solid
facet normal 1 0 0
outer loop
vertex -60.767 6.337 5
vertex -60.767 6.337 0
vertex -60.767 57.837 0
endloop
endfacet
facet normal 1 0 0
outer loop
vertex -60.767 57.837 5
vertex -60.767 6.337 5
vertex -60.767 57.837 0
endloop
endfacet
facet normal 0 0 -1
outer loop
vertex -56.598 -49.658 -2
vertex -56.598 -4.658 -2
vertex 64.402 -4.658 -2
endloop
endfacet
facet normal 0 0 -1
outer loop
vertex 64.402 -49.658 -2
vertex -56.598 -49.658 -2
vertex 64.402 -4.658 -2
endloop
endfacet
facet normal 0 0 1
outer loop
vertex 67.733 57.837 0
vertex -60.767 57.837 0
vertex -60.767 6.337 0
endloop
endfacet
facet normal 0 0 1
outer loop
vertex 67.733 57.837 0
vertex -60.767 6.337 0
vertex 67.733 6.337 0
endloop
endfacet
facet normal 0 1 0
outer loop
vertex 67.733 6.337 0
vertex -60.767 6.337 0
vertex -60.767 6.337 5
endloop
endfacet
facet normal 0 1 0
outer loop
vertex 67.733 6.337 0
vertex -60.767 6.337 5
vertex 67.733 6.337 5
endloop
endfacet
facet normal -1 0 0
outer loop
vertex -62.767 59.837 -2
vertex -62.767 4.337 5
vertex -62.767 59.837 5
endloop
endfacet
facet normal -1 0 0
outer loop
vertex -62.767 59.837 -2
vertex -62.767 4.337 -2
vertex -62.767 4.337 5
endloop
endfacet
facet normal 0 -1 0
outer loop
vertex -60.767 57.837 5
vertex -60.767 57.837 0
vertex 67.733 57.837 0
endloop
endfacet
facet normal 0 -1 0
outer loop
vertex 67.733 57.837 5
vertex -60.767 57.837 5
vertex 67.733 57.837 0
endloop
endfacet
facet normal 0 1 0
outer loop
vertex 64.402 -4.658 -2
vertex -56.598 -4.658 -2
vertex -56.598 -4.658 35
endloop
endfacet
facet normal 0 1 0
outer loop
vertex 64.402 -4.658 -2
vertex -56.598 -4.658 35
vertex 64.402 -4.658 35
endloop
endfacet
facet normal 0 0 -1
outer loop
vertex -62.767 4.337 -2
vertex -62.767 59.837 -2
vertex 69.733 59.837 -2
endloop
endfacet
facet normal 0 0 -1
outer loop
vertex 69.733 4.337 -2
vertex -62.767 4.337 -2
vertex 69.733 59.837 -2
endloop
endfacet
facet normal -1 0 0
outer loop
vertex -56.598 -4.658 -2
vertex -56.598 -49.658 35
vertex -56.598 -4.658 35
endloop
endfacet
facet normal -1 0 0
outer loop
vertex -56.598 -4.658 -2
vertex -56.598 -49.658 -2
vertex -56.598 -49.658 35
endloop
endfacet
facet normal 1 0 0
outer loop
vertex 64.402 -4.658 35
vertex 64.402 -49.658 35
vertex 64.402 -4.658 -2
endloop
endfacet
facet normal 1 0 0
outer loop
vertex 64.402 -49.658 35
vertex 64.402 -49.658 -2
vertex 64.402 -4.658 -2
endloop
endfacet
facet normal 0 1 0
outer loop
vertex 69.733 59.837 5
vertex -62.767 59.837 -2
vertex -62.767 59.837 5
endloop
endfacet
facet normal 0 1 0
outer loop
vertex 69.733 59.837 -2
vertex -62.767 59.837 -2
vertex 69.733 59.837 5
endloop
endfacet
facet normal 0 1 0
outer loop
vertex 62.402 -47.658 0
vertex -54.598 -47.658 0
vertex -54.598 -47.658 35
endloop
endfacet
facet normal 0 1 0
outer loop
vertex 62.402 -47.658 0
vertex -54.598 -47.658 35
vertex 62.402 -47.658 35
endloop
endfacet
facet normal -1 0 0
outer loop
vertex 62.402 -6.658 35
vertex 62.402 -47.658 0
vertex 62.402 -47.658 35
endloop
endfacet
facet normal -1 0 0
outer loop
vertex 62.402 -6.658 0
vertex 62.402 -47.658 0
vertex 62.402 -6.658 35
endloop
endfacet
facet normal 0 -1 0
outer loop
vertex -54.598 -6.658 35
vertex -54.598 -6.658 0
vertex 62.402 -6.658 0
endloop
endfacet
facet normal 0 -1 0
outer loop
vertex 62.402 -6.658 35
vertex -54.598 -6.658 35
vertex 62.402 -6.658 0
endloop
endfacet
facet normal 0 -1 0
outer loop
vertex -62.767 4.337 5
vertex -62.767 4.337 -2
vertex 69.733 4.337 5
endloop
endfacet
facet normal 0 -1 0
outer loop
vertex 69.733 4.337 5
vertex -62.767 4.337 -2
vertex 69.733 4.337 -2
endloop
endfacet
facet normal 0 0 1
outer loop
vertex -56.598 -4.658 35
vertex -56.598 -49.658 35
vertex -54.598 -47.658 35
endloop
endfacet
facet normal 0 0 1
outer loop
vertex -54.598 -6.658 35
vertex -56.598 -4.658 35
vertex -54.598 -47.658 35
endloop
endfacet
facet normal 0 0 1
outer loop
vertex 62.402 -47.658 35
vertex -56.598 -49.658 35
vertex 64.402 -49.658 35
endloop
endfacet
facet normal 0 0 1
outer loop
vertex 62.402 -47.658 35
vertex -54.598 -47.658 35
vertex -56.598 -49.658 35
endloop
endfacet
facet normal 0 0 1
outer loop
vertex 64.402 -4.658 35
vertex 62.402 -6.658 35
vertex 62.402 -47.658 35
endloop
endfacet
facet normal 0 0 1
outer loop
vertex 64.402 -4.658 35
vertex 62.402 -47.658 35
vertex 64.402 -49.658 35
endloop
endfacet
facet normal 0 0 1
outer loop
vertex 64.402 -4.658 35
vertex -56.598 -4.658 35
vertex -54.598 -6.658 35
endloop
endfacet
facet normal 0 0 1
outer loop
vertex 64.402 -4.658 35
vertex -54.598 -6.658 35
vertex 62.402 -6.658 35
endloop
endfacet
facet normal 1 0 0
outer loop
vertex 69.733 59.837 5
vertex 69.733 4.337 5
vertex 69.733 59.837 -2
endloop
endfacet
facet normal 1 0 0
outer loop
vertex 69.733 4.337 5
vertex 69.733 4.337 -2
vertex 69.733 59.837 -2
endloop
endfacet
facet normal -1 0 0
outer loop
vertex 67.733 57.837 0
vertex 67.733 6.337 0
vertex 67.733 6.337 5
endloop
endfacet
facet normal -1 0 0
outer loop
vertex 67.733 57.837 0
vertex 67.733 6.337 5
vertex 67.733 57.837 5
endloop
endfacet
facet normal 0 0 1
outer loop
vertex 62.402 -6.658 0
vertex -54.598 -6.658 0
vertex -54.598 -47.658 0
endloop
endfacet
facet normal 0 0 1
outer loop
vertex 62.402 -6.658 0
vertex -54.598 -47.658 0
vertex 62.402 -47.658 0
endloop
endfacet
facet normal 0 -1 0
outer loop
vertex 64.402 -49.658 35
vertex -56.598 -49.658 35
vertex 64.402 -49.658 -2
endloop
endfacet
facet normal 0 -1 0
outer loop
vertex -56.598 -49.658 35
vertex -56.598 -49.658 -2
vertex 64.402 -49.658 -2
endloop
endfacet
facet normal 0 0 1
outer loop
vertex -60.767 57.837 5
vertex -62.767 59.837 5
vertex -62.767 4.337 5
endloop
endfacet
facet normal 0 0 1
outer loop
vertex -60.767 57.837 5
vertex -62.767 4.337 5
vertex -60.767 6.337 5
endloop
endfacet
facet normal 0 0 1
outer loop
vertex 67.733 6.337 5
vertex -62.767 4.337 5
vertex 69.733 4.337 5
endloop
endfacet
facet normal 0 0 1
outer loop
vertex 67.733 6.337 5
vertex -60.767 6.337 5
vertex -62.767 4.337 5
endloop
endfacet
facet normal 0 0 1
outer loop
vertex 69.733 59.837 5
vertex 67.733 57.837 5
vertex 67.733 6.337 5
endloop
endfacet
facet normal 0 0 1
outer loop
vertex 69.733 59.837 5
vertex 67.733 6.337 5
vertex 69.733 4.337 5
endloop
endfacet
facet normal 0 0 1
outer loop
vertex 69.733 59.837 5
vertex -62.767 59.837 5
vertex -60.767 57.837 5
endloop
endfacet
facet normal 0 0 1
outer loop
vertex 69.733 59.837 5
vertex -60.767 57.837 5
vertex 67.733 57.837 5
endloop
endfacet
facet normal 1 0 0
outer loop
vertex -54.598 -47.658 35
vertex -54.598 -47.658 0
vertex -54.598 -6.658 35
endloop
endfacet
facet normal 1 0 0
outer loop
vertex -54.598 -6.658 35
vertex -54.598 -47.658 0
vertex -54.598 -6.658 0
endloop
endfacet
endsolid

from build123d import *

# Parameters (mm, degrees)
F0_W     = 132.5
F0_H     = 55.5
F0_W_2   = 128.5
F0_H_2   = 51.5
F0_W_3   = 121
F0_H_3   = 45
F0_W_4   = 117
F0_H_4   = 41
F1_DEPTH = 2
F2_DEPTH = 5
F3_DEPTH = 35


with BuildPart() as f1:
    # F0 (on Top) → F1 (new body)
    with BuildSketch(Plane.XY):
        with Locations((3.483113, 32.086735)):
            Rectangle(F0_W, F0_H)
        with Locations((3.483113, 32.086735)):
            Rectangle(F0_W_2, F0_H_2, mode=Mode.SUBTRACT)
        with Locations((3.483113, 32.086735)):
            Rectangle(F0_W_2, F0_H_2)
        with Locations((3.901854, -27.158328)):
            Rectangle(F0_W_3, F0_H_3)
        with Locations((3.901854, -27.158328)):
            Rectangle(F0_W_4, F0_H_4, mode=Mode.SUBTRACT)
        with Locations((3.901854, -27.158328)):
            Rectangle(F0_W_4, F0_H_4)
    extrude(amount=-F1_DEPTH)

    # F0 (on Top) → F2 (join)
    with BuildSketch(Plane.XY):
        with Locations((3.483113, 32.086735)):
            Rectangle(F0_W, F0_H)
        with Locations((3.483113, 32.086735)):
            Rectangle(F0_W_2, F0_H_2, mode=Mode.SUBTRACT)
    extrude(amount=F2_DEPTH)

    # F0 (on Top) → F3 (join)
    with BuildSketch(Plane.XY):
        with Locations((3.901854, -27.158328)):
            Rectangle(F0_W_3, F0_H_3)
        with Locations((3.901854, -27.158328)):
            Rectangle(F0_W_4, F0_H_4, mode=Mode.SUBTRACT)
    extrude(amount=F3_DEPTH)


solid = f1.part
